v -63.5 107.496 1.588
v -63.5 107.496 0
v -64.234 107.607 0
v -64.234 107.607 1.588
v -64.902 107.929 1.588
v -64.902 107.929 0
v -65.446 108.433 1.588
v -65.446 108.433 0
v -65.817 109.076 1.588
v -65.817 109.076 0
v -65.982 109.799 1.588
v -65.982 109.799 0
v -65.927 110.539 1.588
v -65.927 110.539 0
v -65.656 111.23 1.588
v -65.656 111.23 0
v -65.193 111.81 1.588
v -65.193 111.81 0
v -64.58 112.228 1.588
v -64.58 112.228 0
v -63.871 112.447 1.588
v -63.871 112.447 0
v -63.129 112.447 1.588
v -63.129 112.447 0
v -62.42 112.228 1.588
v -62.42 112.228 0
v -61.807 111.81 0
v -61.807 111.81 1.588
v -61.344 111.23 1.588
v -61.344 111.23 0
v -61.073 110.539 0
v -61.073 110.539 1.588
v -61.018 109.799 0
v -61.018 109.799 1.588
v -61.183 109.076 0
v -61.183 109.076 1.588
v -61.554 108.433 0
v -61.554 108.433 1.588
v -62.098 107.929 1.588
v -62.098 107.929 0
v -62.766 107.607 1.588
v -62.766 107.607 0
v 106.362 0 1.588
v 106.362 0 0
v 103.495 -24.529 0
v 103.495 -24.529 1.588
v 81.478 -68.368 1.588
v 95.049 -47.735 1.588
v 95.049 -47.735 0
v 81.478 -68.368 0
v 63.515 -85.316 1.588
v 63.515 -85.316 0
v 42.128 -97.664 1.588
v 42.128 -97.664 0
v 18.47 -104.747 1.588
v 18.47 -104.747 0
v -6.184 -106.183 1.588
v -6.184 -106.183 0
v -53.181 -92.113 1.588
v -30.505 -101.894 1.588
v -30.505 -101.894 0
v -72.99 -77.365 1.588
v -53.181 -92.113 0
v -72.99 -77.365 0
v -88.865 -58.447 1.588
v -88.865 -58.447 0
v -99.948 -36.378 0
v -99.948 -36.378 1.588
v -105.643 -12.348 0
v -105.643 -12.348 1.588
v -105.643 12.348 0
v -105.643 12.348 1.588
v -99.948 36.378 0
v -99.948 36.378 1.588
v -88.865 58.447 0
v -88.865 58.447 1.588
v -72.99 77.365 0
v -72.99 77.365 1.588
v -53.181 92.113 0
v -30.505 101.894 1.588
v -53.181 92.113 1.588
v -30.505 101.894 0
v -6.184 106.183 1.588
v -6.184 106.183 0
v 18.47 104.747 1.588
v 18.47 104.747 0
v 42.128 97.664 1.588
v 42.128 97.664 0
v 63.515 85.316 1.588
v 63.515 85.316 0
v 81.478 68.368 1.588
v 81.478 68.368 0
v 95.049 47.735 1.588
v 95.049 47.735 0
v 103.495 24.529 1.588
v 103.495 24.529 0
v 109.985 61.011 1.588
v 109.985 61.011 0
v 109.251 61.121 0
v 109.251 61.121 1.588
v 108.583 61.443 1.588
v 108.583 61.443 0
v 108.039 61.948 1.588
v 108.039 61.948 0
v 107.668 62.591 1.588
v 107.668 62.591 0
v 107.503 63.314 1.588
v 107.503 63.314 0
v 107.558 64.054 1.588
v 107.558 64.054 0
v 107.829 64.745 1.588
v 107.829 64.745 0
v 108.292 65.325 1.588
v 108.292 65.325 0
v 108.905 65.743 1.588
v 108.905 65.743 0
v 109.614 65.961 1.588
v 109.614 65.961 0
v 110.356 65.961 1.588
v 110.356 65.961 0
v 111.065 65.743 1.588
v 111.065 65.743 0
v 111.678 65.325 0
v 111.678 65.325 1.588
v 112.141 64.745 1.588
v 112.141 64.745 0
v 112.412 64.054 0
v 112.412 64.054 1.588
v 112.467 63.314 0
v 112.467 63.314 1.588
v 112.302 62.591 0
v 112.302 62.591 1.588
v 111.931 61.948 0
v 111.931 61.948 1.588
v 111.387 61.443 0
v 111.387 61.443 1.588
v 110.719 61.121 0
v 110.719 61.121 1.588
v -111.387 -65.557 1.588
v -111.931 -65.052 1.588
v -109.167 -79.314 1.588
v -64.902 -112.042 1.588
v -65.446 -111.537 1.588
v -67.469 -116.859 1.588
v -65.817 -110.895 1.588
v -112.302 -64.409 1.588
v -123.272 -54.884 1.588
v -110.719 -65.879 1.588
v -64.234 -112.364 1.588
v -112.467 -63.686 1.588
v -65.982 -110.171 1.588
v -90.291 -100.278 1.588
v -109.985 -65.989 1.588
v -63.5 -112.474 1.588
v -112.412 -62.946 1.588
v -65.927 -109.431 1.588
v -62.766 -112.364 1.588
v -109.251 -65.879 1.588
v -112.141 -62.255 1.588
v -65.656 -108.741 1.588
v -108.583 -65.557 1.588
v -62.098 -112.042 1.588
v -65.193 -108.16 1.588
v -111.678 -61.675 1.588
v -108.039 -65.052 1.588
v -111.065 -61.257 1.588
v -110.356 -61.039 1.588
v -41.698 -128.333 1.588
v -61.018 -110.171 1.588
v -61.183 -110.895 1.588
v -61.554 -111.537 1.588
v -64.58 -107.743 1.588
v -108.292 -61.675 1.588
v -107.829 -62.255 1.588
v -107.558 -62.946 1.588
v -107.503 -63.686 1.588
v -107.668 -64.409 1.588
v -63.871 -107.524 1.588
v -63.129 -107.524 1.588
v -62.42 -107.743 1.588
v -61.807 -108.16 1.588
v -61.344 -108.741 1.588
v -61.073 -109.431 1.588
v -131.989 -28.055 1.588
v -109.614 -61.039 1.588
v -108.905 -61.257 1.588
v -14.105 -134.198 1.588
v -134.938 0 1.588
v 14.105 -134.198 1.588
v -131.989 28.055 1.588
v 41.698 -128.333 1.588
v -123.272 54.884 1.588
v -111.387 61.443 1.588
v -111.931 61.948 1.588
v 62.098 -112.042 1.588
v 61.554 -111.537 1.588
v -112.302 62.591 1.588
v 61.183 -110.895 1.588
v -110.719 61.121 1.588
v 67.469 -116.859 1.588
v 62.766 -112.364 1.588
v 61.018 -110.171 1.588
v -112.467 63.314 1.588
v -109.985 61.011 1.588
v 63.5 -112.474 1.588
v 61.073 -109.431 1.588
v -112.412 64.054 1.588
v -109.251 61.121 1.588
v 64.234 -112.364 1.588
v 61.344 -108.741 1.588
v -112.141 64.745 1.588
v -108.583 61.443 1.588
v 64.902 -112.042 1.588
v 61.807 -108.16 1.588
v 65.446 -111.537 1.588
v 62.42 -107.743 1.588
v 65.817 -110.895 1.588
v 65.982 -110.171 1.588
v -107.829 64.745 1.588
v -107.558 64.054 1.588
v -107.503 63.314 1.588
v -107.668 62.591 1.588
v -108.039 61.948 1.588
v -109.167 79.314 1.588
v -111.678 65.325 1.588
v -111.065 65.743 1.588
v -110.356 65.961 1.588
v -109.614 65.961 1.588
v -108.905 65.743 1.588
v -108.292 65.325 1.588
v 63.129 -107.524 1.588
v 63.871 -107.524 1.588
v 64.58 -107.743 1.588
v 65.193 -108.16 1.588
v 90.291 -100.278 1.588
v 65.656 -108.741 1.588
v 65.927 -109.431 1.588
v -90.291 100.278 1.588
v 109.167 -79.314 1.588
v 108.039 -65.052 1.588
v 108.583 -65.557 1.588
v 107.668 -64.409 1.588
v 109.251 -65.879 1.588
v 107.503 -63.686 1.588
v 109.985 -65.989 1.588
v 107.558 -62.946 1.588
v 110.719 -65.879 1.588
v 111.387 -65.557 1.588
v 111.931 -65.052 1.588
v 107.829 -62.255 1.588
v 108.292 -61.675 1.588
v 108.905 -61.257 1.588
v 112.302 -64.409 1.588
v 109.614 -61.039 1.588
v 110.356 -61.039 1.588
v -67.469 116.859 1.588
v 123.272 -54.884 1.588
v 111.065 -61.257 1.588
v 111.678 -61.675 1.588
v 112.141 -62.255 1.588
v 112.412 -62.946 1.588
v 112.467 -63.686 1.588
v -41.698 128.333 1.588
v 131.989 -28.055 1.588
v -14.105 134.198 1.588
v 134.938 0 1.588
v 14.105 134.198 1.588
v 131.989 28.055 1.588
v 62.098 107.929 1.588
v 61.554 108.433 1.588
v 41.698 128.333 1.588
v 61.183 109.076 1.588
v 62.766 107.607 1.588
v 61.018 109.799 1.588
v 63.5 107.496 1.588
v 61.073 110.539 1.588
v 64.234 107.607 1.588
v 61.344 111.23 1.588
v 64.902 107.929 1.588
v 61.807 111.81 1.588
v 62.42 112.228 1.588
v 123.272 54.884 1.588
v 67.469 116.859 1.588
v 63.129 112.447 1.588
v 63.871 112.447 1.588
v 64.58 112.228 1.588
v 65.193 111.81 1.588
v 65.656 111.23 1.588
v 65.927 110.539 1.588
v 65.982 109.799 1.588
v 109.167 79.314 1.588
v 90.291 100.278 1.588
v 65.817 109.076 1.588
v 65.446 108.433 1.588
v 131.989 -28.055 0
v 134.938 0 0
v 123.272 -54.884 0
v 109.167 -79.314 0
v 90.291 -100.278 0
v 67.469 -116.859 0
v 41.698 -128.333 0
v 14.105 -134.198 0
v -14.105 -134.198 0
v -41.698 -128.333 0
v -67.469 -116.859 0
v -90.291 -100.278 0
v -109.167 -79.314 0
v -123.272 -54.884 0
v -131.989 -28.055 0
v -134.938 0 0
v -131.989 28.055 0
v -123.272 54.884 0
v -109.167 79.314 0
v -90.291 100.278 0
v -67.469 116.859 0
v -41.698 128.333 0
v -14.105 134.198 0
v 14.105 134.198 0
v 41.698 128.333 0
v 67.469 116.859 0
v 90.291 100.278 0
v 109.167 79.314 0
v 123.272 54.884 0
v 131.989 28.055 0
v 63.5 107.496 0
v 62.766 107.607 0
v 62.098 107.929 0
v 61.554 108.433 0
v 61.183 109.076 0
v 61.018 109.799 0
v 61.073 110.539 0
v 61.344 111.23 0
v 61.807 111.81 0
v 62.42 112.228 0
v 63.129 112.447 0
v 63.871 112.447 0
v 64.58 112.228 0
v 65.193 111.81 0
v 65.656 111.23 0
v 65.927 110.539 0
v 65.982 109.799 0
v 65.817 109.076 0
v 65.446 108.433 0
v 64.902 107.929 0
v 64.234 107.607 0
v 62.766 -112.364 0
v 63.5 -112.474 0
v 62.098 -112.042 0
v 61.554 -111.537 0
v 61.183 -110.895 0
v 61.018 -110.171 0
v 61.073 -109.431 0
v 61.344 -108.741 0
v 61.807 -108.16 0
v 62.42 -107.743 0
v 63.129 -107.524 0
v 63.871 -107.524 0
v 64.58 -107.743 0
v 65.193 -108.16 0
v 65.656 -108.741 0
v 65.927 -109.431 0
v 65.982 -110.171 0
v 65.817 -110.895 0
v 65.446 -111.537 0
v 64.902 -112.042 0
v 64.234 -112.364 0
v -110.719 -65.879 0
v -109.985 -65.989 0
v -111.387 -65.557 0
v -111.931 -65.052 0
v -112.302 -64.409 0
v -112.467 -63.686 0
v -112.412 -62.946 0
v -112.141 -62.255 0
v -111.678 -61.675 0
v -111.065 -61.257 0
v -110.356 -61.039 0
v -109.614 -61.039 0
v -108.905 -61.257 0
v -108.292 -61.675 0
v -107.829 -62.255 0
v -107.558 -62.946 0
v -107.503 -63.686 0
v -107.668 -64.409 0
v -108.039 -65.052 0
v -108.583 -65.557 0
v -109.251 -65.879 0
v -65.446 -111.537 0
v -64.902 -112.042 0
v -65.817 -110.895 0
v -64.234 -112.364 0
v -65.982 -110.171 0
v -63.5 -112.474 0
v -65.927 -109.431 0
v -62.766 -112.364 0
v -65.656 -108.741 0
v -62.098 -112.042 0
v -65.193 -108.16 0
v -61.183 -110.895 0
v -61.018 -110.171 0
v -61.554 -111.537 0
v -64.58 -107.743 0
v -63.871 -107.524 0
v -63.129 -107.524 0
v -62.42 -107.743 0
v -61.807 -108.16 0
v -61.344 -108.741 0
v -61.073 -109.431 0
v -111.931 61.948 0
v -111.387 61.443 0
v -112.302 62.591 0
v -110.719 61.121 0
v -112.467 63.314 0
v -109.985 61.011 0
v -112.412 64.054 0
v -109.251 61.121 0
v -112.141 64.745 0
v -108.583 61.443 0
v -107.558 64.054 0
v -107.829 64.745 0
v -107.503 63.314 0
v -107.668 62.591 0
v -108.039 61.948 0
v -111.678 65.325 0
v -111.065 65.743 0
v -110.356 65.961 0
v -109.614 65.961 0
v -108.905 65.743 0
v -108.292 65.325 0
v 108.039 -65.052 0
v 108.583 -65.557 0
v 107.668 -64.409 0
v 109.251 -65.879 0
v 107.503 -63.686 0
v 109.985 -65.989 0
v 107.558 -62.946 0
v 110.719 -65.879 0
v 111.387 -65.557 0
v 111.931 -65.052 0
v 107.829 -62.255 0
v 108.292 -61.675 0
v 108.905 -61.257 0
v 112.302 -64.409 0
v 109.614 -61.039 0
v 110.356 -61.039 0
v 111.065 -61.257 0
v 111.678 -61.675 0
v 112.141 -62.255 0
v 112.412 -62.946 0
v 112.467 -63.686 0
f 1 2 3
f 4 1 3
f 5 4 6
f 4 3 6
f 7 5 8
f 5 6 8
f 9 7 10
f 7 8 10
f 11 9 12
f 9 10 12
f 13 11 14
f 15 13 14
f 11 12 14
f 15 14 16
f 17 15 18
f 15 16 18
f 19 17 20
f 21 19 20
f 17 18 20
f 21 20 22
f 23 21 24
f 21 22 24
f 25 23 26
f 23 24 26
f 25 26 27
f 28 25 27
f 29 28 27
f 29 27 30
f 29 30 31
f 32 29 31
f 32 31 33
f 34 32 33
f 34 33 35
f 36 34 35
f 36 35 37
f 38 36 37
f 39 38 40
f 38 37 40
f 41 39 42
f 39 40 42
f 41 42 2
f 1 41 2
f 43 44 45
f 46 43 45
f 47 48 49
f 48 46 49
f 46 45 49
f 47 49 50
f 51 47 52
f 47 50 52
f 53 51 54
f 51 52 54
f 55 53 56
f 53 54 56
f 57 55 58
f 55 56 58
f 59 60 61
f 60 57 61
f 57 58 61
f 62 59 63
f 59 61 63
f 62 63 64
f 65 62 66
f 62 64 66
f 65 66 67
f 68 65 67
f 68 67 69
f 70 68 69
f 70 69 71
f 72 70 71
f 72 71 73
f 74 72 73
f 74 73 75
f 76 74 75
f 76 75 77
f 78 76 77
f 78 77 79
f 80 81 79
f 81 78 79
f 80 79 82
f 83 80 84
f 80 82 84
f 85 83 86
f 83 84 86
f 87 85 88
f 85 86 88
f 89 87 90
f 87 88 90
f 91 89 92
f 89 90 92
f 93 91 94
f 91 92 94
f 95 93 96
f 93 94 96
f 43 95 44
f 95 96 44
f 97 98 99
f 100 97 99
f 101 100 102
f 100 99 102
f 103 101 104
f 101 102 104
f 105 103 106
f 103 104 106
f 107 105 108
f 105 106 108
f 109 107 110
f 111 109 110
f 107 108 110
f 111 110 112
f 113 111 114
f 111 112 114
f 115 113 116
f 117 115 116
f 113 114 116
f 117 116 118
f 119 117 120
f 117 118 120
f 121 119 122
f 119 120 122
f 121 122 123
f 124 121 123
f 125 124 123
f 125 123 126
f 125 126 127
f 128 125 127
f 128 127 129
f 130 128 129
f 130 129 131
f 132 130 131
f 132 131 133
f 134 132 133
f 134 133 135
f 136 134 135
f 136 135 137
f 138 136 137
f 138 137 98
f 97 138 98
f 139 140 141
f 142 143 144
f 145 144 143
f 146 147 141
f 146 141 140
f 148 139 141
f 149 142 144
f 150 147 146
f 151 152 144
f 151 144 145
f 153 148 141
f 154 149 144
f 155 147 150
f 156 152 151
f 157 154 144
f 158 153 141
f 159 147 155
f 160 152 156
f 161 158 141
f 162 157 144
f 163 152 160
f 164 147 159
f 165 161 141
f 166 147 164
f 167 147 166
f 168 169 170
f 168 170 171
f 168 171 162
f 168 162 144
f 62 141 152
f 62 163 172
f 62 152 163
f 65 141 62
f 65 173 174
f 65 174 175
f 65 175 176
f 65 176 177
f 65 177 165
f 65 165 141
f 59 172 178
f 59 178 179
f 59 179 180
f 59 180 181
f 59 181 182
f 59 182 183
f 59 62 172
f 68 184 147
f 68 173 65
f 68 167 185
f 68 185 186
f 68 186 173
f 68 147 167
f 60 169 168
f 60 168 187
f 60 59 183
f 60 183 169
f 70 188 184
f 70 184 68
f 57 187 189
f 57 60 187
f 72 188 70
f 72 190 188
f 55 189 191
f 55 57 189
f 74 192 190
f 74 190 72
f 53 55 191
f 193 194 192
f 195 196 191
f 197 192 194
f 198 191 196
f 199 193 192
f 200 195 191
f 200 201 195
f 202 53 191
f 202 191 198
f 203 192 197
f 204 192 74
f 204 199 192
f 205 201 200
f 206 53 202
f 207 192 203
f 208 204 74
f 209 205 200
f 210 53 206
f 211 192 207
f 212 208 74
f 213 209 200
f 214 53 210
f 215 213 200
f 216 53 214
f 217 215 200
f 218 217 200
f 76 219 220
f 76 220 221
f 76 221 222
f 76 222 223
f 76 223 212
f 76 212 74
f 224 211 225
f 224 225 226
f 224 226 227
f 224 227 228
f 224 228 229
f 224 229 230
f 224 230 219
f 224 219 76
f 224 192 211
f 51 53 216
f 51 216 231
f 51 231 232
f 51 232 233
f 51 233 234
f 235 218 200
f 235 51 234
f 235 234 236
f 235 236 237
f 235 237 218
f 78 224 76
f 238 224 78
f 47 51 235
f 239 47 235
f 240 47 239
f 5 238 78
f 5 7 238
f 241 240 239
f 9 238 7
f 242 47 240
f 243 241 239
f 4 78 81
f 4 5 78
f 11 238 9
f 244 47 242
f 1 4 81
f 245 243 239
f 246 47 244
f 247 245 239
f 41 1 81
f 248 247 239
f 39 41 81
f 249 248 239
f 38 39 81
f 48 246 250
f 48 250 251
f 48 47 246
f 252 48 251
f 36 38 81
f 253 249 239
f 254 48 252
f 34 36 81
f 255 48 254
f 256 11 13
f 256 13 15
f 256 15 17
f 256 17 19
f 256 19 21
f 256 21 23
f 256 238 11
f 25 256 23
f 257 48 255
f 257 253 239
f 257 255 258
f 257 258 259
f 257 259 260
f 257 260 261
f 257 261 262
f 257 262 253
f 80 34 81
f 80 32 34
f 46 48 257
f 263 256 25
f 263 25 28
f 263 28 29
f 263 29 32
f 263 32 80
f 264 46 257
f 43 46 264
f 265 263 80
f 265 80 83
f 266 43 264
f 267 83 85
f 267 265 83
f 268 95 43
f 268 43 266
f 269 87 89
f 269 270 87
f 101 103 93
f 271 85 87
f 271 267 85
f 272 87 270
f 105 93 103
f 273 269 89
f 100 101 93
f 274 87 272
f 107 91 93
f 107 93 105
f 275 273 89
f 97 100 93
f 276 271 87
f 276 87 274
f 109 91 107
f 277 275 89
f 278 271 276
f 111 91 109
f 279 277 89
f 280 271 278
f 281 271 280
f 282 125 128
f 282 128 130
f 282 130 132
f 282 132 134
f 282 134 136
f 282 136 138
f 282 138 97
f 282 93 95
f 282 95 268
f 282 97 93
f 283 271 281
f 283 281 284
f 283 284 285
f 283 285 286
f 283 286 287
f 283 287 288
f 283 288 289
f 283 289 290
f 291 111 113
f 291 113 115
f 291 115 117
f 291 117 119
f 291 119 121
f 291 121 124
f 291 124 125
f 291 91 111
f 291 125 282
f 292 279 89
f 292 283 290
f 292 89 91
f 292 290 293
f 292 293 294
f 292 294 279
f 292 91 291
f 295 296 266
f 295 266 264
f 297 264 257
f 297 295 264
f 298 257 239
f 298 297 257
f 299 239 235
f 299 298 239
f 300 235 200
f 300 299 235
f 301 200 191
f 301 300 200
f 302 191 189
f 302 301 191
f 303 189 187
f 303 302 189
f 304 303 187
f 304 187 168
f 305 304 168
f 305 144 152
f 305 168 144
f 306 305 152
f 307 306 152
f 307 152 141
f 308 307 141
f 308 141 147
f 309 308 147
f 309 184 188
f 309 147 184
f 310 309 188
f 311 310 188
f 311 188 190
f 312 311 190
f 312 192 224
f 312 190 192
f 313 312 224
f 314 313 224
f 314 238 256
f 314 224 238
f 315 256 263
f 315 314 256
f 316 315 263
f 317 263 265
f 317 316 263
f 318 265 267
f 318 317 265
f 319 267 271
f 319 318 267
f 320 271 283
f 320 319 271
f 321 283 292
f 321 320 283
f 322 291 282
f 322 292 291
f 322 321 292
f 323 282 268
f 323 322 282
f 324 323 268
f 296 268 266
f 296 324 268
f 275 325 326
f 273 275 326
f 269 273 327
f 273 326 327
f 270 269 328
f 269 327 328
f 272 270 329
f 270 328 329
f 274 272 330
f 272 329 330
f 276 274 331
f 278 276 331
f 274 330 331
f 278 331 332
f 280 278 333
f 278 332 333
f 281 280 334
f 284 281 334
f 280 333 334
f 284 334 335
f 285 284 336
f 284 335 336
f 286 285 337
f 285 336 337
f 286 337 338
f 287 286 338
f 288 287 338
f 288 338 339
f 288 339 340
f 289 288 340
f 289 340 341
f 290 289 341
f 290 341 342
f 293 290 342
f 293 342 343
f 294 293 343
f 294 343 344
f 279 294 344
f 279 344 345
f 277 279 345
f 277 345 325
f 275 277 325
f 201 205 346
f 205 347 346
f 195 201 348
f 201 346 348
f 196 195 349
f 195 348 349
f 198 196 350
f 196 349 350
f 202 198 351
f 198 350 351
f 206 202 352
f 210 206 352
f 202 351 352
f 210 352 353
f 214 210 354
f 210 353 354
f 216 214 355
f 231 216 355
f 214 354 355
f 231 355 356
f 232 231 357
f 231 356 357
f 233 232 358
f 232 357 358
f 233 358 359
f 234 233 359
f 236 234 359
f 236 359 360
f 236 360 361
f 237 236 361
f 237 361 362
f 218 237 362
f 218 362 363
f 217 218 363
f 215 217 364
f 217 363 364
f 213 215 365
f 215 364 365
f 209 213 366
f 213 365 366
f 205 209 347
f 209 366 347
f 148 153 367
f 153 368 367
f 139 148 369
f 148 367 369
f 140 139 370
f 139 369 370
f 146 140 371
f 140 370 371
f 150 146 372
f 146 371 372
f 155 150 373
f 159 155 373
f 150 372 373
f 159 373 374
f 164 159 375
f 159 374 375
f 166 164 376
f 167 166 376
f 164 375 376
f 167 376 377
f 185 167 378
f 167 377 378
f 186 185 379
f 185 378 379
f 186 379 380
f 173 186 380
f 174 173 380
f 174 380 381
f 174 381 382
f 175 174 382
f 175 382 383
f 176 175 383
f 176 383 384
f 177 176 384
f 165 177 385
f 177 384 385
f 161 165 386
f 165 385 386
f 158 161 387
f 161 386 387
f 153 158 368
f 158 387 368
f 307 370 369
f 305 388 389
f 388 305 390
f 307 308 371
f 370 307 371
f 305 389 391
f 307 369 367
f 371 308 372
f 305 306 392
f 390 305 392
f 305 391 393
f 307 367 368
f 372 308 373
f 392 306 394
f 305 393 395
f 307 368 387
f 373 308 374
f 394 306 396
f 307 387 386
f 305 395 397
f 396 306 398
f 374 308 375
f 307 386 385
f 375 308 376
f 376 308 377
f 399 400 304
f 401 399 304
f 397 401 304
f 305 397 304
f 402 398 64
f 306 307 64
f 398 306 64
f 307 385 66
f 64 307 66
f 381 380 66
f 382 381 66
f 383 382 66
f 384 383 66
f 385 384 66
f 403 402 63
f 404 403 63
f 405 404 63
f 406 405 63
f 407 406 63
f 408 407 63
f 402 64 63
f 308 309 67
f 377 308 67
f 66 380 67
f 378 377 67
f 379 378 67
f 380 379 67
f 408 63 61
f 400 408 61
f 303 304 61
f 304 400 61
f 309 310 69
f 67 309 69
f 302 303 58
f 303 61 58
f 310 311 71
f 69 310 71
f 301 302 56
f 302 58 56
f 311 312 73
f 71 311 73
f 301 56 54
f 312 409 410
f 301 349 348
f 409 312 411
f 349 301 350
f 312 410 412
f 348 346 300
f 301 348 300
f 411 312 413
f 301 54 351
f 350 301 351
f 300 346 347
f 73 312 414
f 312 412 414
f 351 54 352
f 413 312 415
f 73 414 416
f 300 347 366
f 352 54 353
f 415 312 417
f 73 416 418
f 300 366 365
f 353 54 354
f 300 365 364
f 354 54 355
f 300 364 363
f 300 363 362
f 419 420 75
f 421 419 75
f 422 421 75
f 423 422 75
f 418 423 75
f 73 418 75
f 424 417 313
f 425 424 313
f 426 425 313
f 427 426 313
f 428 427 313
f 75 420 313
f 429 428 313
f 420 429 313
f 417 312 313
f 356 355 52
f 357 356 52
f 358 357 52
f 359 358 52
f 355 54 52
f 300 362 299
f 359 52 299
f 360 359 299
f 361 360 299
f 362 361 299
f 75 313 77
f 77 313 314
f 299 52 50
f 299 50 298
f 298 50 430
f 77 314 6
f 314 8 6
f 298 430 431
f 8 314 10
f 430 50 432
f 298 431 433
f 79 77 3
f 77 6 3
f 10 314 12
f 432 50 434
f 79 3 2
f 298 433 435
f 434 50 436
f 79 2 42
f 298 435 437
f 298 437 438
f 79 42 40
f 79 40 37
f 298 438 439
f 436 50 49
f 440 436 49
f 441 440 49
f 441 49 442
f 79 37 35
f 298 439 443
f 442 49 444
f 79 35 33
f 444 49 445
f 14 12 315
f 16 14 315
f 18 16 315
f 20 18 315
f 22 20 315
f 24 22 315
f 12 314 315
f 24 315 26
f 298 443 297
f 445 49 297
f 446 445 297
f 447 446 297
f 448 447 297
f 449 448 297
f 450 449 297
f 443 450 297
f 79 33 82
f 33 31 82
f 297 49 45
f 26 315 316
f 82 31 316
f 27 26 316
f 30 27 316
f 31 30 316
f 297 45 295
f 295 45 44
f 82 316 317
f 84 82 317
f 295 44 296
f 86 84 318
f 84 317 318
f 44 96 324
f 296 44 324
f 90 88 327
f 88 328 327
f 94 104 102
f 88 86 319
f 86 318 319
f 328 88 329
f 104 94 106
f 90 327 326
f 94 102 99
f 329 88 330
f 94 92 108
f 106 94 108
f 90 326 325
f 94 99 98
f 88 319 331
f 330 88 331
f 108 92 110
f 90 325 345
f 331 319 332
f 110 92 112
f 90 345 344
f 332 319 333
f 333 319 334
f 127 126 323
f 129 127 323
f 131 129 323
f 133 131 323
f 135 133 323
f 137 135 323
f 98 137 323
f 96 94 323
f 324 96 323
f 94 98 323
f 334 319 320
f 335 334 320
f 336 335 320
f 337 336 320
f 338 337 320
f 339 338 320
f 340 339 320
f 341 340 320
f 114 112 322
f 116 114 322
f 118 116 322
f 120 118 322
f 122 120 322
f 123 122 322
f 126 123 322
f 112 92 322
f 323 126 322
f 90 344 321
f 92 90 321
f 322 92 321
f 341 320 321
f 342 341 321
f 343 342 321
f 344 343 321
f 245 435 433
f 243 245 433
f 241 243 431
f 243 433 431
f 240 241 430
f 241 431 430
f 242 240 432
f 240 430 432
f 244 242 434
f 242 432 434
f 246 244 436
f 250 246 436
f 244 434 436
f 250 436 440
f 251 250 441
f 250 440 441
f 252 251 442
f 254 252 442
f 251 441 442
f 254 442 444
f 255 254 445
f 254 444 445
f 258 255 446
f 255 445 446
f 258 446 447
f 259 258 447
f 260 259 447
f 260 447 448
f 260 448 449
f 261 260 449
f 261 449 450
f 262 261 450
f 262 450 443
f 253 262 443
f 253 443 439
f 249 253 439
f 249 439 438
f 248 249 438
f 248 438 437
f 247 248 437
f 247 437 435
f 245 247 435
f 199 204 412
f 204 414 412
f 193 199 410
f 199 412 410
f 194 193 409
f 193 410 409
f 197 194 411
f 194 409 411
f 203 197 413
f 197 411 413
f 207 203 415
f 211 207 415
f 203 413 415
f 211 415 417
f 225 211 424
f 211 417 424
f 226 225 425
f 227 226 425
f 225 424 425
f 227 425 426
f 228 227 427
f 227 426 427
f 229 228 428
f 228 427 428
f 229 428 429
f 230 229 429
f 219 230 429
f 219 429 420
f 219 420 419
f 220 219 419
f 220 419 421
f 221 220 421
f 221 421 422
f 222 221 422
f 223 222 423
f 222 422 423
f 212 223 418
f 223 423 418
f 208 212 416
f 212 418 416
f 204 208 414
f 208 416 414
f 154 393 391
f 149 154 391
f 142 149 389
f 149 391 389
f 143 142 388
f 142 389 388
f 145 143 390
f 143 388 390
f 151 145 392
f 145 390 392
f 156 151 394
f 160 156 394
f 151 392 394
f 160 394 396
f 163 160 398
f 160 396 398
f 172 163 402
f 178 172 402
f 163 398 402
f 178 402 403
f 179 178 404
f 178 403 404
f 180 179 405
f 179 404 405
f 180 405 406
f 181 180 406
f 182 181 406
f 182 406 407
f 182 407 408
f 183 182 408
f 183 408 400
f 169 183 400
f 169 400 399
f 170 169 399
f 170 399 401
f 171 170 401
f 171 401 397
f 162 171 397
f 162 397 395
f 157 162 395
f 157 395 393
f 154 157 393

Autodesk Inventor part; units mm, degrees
ref_plane "YZ Plane" through (0, 0, 0) normal (1, 0, 0) x (0, 1, 0)
ref_plane "XZ Plane" through (0, 0, 0) normal (0, 1, 0) x (-1, 0, 0)
ref_plane "XY Plane" through (0, 0, 0) normal (0, 0, 1) x (1, 0, 0)
sketch "Sketch1" plane through (0, 0, 0) normal (0, 0, 1) x (1, 0, 0)
  circle A0 centre (0, 0) radius 106.3625
  circle A1 centre (0, 0) radius 134.9375
  dimension "d0" = 212.725
  dimension "d1" = 269.875
extrude "Extrusion1" add sketch "Sketch1" along normal blind 1.5875
sketch "Sketch2" plane through (0, 0, 1.5875) normal (0, 0, 1) x (1, 0, 0)
  point P0 (0, 0)
  point P1 (0, 127)
  point P2 (-63.5, 109.9852)
  point P3 (-109.9852, 63.5)
  point P4 (-127, 0)
  point P5 (-109.9852, -63.5)
  point P6 (-63.5, -109.9852)
  point P7 (0, -127)
  point P8 (63.5, -109.9852)
  point P9 (109.9852, -63.5)
  point P10 (127, 0)
  point P11 (109.9852, 63.5)
  point P12 (63.5, 109.9852)
  dimension "d4" = 127
  dimension "d7" = 360
hole "Hole1" at (-63.5, 109.9852, 1.5875) at (-109.9852, 63.5, 1.5875) at (-109.9852, -63.5, 1.5875) at (-63.5, -109.9852, 1.5875) at (63.5, 109.9852, 1.5875) at (109.9852, 63.5, 1.5875) at (109.9852, -63.5, 1.5875) at (63.5, -109.9852, 1.5875) direction (0, 0, -1) diameter 4.9784 end through all clearance for "Flat Head Machine Screw (82)" size "#10" standard "Ansi Unified Screw Threads"
properties part number "3DPRINT,TURRET,SPACER" material "Nylon 6/6"
